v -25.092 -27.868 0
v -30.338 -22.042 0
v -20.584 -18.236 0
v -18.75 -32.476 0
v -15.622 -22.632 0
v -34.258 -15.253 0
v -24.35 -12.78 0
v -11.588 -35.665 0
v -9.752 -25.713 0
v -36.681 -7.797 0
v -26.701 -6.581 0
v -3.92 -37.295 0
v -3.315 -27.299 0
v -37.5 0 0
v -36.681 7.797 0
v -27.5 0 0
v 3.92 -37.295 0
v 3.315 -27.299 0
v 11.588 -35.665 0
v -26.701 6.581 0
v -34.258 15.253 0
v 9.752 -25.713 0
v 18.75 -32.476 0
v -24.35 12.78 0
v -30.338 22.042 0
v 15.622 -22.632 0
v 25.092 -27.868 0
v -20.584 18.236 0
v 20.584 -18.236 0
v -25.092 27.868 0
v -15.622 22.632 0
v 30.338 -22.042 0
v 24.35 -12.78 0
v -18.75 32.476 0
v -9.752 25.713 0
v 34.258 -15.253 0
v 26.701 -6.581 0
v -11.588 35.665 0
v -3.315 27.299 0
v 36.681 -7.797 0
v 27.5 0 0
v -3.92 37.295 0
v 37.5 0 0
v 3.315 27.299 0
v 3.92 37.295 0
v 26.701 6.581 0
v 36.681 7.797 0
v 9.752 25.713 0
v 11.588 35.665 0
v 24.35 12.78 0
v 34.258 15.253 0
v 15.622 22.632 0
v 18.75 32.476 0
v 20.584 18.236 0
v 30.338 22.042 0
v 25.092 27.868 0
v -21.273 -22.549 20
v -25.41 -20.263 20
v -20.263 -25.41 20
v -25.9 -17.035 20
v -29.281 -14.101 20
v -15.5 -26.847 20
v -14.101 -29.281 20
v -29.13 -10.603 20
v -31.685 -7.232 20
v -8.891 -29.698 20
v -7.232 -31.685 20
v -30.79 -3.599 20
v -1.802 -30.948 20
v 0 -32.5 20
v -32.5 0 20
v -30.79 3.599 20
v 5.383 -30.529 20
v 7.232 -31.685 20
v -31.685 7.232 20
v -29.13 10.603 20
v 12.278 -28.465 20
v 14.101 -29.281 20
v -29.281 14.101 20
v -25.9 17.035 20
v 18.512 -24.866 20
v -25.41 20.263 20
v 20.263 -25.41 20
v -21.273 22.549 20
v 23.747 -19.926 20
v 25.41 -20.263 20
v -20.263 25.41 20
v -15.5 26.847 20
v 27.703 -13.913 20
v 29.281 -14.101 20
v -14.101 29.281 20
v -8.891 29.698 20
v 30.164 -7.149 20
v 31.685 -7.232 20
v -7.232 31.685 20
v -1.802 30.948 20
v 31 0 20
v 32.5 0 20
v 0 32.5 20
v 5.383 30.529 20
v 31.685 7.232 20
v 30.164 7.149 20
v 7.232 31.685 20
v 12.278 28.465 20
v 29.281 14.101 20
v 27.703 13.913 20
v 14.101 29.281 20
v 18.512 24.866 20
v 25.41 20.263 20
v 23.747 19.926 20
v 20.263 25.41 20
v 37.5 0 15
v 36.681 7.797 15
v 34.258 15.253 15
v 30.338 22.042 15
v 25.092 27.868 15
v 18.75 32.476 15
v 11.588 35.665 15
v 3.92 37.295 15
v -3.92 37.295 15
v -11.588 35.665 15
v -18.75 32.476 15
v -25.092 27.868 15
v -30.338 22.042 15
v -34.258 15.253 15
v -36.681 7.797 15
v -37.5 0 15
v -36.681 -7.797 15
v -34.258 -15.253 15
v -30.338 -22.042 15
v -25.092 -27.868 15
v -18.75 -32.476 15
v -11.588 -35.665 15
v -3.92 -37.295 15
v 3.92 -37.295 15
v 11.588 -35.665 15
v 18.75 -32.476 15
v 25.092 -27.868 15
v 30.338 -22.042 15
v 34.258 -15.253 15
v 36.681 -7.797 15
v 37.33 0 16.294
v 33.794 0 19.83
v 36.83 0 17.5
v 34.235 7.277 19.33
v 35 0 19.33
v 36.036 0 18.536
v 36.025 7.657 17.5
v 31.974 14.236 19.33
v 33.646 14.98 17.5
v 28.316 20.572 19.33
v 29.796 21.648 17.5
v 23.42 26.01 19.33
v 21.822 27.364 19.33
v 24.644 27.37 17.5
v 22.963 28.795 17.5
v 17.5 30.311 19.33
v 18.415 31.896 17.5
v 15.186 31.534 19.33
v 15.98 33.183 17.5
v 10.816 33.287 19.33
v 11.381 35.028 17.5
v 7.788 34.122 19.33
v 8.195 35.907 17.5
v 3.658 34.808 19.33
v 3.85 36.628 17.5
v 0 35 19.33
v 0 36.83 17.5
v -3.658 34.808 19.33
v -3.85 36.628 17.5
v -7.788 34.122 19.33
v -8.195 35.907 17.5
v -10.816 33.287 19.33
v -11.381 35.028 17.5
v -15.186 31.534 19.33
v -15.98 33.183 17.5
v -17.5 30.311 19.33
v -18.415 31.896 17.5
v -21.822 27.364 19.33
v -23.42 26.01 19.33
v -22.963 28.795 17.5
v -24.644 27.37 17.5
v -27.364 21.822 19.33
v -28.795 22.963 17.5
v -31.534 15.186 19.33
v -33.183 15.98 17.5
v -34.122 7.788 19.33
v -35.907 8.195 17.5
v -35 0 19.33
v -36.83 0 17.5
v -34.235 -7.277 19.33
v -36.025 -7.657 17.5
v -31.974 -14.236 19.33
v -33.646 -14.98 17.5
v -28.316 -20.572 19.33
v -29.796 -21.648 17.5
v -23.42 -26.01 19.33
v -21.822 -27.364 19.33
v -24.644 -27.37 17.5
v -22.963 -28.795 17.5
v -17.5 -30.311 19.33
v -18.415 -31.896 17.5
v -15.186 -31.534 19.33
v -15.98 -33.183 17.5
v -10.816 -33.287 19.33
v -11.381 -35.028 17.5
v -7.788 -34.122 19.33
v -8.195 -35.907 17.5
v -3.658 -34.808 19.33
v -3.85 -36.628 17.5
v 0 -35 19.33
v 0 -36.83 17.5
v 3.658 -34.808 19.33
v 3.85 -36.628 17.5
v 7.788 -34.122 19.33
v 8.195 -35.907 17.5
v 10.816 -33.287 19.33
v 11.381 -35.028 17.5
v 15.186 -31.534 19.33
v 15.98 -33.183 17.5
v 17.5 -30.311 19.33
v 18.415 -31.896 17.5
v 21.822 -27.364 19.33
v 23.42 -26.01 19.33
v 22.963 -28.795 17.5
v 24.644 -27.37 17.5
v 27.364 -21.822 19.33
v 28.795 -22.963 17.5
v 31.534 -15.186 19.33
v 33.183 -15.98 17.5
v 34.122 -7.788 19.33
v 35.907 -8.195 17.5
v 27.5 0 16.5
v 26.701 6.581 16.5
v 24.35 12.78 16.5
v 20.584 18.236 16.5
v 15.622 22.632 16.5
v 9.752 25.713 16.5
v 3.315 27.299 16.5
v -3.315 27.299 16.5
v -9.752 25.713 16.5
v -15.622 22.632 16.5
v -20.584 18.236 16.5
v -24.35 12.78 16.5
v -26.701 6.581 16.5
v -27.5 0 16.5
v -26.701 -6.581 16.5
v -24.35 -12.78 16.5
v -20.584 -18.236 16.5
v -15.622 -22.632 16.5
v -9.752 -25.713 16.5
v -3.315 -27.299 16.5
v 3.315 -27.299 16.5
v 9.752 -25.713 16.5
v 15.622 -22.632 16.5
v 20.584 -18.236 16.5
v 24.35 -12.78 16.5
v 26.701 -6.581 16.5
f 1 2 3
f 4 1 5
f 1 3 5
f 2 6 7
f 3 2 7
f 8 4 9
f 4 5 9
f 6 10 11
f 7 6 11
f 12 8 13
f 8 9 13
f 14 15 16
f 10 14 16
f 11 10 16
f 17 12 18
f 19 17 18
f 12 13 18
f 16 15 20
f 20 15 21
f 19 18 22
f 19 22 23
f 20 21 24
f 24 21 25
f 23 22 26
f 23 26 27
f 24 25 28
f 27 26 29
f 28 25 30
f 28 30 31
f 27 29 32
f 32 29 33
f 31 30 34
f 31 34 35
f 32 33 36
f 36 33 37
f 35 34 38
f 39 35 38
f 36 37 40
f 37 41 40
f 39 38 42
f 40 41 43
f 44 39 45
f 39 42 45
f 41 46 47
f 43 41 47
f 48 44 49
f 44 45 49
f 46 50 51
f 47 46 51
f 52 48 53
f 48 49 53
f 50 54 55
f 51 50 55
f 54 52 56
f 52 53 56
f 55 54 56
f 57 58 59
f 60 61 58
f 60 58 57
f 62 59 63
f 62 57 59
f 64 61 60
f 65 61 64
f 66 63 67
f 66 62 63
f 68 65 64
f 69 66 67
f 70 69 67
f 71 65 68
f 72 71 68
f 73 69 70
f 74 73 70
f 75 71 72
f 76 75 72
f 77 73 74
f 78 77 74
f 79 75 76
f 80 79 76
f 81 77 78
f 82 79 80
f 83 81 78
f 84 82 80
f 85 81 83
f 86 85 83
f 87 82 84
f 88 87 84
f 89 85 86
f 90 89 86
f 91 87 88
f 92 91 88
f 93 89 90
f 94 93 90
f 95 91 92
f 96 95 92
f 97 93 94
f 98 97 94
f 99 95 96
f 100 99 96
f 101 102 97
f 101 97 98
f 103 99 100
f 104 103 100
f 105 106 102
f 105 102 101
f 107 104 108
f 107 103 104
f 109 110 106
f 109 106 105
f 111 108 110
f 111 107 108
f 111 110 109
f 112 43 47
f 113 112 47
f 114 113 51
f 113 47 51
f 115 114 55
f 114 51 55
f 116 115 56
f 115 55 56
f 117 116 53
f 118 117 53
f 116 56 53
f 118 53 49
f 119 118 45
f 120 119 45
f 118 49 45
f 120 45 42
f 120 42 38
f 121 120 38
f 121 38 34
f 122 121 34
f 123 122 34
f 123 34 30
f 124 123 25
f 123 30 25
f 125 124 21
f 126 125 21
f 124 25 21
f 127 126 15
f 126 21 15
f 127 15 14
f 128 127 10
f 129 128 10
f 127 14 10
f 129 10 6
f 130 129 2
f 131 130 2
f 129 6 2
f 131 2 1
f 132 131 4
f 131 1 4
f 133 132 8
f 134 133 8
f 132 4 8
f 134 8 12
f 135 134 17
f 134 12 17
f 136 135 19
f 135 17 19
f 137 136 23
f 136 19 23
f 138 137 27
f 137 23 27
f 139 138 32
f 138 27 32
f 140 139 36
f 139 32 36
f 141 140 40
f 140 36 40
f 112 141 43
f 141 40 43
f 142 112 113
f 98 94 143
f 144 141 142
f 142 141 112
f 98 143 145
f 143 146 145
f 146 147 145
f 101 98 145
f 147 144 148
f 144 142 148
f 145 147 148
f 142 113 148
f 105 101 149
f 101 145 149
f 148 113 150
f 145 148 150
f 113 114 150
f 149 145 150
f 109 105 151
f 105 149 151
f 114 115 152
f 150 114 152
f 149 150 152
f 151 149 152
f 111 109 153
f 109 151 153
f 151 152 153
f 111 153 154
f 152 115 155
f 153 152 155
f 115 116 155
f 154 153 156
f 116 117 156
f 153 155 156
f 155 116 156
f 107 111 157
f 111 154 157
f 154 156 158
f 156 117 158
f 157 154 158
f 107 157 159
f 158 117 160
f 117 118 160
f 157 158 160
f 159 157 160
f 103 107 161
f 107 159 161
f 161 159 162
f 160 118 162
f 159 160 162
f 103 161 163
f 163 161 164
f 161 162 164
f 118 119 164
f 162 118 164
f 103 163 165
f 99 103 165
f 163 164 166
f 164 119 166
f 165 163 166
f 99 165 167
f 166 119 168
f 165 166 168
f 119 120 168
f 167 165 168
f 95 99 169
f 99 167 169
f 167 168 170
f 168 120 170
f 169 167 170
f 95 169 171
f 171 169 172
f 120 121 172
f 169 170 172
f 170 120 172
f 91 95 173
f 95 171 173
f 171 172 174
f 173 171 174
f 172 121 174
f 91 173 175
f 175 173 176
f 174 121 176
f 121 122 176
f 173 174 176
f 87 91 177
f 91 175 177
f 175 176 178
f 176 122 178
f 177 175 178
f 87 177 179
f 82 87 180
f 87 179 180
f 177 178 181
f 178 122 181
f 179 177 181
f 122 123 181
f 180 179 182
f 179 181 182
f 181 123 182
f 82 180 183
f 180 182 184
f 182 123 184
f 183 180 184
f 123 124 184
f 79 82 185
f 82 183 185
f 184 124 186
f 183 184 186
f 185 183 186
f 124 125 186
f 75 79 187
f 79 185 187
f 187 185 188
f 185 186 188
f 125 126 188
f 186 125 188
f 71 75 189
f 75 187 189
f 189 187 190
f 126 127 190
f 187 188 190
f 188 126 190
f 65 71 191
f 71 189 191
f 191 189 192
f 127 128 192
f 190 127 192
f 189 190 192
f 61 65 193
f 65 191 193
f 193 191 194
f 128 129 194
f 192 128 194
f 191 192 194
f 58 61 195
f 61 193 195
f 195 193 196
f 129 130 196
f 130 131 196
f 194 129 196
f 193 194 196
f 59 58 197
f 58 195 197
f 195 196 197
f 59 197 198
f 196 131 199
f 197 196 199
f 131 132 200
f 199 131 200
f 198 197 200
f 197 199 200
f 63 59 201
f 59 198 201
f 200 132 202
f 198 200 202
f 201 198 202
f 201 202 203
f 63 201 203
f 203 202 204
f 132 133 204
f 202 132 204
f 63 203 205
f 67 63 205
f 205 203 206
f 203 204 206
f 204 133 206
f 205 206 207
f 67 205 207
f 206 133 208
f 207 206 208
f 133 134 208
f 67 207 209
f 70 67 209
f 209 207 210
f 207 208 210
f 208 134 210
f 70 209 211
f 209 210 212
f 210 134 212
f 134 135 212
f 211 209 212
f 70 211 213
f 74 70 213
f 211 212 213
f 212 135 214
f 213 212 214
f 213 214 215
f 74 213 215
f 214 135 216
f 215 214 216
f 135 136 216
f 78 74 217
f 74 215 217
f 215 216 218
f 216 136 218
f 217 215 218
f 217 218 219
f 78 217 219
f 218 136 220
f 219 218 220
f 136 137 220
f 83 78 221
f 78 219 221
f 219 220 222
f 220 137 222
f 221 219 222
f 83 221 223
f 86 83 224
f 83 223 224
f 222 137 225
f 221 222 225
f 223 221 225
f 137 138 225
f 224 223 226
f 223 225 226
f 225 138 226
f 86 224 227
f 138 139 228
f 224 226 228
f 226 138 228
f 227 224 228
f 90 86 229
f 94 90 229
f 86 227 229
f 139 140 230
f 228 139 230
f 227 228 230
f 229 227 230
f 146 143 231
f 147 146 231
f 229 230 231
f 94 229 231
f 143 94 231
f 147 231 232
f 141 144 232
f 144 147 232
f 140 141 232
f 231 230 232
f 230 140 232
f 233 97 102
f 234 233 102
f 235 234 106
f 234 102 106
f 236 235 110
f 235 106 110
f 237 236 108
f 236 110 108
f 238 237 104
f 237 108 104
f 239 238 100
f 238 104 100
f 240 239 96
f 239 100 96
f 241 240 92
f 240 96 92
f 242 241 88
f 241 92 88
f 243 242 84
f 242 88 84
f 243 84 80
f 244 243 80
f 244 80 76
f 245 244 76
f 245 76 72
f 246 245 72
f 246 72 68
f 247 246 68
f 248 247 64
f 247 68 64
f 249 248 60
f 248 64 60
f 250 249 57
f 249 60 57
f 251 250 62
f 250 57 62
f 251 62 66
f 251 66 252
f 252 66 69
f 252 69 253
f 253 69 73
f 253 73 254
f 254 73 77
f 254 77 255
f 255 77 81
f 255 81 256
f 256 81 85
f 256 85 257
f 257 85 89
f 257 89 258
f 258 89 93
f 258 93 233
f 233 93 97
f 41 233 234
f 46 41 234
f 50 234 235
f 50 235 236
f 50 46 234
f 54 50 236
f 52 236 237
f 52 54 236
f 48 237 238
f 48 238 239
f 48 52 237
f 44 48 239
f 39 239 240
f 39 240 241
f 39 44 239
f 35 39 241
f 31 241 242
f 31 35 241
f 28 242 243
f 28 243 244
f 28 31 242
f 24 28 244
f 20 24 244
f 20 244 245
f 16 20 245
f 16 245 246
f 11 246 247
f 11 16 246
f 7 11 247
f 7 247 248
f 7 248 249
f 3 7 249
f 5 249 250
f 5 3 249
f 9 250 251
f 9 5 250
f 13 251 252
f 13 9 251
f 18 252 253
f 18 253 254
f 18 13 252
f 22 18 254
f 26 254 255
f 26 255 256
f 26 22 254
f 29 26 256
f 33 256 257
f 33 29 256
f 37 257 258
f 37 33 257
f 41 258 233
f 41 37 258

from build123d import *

# Parameters (mm, degrees)
F0_R     = 37.5
F0_R_2   = 27.5
F1_DEPTH = 20
F2_SIZE  = 3.5
F3_R     = 5


with BuildPart() as f1:
    # F0 (on Top) → F1 (new body)
    with BuildSketch(Plane.XY):
        Circle(F0_R)
        Circle(F0_R_2, mode=Mode.SUBTRACT)
    extrude(amount=F1_DEPTH)

    # F2
    f2_edges = [f1.edges().sort_by_distance(p)[0] for p in [
        (-27.5, 0, 20),
    ]]
    chamfer(f2_edges, length=F2_SIZE)

    # F3
    f3_edges = [f1.edges().sort_by_distance(p)[0] for p in [
        (-37.5, 0, 20),
    ]]
    fillet(f3_edges, radius=F3_R)


solid = f1.part
